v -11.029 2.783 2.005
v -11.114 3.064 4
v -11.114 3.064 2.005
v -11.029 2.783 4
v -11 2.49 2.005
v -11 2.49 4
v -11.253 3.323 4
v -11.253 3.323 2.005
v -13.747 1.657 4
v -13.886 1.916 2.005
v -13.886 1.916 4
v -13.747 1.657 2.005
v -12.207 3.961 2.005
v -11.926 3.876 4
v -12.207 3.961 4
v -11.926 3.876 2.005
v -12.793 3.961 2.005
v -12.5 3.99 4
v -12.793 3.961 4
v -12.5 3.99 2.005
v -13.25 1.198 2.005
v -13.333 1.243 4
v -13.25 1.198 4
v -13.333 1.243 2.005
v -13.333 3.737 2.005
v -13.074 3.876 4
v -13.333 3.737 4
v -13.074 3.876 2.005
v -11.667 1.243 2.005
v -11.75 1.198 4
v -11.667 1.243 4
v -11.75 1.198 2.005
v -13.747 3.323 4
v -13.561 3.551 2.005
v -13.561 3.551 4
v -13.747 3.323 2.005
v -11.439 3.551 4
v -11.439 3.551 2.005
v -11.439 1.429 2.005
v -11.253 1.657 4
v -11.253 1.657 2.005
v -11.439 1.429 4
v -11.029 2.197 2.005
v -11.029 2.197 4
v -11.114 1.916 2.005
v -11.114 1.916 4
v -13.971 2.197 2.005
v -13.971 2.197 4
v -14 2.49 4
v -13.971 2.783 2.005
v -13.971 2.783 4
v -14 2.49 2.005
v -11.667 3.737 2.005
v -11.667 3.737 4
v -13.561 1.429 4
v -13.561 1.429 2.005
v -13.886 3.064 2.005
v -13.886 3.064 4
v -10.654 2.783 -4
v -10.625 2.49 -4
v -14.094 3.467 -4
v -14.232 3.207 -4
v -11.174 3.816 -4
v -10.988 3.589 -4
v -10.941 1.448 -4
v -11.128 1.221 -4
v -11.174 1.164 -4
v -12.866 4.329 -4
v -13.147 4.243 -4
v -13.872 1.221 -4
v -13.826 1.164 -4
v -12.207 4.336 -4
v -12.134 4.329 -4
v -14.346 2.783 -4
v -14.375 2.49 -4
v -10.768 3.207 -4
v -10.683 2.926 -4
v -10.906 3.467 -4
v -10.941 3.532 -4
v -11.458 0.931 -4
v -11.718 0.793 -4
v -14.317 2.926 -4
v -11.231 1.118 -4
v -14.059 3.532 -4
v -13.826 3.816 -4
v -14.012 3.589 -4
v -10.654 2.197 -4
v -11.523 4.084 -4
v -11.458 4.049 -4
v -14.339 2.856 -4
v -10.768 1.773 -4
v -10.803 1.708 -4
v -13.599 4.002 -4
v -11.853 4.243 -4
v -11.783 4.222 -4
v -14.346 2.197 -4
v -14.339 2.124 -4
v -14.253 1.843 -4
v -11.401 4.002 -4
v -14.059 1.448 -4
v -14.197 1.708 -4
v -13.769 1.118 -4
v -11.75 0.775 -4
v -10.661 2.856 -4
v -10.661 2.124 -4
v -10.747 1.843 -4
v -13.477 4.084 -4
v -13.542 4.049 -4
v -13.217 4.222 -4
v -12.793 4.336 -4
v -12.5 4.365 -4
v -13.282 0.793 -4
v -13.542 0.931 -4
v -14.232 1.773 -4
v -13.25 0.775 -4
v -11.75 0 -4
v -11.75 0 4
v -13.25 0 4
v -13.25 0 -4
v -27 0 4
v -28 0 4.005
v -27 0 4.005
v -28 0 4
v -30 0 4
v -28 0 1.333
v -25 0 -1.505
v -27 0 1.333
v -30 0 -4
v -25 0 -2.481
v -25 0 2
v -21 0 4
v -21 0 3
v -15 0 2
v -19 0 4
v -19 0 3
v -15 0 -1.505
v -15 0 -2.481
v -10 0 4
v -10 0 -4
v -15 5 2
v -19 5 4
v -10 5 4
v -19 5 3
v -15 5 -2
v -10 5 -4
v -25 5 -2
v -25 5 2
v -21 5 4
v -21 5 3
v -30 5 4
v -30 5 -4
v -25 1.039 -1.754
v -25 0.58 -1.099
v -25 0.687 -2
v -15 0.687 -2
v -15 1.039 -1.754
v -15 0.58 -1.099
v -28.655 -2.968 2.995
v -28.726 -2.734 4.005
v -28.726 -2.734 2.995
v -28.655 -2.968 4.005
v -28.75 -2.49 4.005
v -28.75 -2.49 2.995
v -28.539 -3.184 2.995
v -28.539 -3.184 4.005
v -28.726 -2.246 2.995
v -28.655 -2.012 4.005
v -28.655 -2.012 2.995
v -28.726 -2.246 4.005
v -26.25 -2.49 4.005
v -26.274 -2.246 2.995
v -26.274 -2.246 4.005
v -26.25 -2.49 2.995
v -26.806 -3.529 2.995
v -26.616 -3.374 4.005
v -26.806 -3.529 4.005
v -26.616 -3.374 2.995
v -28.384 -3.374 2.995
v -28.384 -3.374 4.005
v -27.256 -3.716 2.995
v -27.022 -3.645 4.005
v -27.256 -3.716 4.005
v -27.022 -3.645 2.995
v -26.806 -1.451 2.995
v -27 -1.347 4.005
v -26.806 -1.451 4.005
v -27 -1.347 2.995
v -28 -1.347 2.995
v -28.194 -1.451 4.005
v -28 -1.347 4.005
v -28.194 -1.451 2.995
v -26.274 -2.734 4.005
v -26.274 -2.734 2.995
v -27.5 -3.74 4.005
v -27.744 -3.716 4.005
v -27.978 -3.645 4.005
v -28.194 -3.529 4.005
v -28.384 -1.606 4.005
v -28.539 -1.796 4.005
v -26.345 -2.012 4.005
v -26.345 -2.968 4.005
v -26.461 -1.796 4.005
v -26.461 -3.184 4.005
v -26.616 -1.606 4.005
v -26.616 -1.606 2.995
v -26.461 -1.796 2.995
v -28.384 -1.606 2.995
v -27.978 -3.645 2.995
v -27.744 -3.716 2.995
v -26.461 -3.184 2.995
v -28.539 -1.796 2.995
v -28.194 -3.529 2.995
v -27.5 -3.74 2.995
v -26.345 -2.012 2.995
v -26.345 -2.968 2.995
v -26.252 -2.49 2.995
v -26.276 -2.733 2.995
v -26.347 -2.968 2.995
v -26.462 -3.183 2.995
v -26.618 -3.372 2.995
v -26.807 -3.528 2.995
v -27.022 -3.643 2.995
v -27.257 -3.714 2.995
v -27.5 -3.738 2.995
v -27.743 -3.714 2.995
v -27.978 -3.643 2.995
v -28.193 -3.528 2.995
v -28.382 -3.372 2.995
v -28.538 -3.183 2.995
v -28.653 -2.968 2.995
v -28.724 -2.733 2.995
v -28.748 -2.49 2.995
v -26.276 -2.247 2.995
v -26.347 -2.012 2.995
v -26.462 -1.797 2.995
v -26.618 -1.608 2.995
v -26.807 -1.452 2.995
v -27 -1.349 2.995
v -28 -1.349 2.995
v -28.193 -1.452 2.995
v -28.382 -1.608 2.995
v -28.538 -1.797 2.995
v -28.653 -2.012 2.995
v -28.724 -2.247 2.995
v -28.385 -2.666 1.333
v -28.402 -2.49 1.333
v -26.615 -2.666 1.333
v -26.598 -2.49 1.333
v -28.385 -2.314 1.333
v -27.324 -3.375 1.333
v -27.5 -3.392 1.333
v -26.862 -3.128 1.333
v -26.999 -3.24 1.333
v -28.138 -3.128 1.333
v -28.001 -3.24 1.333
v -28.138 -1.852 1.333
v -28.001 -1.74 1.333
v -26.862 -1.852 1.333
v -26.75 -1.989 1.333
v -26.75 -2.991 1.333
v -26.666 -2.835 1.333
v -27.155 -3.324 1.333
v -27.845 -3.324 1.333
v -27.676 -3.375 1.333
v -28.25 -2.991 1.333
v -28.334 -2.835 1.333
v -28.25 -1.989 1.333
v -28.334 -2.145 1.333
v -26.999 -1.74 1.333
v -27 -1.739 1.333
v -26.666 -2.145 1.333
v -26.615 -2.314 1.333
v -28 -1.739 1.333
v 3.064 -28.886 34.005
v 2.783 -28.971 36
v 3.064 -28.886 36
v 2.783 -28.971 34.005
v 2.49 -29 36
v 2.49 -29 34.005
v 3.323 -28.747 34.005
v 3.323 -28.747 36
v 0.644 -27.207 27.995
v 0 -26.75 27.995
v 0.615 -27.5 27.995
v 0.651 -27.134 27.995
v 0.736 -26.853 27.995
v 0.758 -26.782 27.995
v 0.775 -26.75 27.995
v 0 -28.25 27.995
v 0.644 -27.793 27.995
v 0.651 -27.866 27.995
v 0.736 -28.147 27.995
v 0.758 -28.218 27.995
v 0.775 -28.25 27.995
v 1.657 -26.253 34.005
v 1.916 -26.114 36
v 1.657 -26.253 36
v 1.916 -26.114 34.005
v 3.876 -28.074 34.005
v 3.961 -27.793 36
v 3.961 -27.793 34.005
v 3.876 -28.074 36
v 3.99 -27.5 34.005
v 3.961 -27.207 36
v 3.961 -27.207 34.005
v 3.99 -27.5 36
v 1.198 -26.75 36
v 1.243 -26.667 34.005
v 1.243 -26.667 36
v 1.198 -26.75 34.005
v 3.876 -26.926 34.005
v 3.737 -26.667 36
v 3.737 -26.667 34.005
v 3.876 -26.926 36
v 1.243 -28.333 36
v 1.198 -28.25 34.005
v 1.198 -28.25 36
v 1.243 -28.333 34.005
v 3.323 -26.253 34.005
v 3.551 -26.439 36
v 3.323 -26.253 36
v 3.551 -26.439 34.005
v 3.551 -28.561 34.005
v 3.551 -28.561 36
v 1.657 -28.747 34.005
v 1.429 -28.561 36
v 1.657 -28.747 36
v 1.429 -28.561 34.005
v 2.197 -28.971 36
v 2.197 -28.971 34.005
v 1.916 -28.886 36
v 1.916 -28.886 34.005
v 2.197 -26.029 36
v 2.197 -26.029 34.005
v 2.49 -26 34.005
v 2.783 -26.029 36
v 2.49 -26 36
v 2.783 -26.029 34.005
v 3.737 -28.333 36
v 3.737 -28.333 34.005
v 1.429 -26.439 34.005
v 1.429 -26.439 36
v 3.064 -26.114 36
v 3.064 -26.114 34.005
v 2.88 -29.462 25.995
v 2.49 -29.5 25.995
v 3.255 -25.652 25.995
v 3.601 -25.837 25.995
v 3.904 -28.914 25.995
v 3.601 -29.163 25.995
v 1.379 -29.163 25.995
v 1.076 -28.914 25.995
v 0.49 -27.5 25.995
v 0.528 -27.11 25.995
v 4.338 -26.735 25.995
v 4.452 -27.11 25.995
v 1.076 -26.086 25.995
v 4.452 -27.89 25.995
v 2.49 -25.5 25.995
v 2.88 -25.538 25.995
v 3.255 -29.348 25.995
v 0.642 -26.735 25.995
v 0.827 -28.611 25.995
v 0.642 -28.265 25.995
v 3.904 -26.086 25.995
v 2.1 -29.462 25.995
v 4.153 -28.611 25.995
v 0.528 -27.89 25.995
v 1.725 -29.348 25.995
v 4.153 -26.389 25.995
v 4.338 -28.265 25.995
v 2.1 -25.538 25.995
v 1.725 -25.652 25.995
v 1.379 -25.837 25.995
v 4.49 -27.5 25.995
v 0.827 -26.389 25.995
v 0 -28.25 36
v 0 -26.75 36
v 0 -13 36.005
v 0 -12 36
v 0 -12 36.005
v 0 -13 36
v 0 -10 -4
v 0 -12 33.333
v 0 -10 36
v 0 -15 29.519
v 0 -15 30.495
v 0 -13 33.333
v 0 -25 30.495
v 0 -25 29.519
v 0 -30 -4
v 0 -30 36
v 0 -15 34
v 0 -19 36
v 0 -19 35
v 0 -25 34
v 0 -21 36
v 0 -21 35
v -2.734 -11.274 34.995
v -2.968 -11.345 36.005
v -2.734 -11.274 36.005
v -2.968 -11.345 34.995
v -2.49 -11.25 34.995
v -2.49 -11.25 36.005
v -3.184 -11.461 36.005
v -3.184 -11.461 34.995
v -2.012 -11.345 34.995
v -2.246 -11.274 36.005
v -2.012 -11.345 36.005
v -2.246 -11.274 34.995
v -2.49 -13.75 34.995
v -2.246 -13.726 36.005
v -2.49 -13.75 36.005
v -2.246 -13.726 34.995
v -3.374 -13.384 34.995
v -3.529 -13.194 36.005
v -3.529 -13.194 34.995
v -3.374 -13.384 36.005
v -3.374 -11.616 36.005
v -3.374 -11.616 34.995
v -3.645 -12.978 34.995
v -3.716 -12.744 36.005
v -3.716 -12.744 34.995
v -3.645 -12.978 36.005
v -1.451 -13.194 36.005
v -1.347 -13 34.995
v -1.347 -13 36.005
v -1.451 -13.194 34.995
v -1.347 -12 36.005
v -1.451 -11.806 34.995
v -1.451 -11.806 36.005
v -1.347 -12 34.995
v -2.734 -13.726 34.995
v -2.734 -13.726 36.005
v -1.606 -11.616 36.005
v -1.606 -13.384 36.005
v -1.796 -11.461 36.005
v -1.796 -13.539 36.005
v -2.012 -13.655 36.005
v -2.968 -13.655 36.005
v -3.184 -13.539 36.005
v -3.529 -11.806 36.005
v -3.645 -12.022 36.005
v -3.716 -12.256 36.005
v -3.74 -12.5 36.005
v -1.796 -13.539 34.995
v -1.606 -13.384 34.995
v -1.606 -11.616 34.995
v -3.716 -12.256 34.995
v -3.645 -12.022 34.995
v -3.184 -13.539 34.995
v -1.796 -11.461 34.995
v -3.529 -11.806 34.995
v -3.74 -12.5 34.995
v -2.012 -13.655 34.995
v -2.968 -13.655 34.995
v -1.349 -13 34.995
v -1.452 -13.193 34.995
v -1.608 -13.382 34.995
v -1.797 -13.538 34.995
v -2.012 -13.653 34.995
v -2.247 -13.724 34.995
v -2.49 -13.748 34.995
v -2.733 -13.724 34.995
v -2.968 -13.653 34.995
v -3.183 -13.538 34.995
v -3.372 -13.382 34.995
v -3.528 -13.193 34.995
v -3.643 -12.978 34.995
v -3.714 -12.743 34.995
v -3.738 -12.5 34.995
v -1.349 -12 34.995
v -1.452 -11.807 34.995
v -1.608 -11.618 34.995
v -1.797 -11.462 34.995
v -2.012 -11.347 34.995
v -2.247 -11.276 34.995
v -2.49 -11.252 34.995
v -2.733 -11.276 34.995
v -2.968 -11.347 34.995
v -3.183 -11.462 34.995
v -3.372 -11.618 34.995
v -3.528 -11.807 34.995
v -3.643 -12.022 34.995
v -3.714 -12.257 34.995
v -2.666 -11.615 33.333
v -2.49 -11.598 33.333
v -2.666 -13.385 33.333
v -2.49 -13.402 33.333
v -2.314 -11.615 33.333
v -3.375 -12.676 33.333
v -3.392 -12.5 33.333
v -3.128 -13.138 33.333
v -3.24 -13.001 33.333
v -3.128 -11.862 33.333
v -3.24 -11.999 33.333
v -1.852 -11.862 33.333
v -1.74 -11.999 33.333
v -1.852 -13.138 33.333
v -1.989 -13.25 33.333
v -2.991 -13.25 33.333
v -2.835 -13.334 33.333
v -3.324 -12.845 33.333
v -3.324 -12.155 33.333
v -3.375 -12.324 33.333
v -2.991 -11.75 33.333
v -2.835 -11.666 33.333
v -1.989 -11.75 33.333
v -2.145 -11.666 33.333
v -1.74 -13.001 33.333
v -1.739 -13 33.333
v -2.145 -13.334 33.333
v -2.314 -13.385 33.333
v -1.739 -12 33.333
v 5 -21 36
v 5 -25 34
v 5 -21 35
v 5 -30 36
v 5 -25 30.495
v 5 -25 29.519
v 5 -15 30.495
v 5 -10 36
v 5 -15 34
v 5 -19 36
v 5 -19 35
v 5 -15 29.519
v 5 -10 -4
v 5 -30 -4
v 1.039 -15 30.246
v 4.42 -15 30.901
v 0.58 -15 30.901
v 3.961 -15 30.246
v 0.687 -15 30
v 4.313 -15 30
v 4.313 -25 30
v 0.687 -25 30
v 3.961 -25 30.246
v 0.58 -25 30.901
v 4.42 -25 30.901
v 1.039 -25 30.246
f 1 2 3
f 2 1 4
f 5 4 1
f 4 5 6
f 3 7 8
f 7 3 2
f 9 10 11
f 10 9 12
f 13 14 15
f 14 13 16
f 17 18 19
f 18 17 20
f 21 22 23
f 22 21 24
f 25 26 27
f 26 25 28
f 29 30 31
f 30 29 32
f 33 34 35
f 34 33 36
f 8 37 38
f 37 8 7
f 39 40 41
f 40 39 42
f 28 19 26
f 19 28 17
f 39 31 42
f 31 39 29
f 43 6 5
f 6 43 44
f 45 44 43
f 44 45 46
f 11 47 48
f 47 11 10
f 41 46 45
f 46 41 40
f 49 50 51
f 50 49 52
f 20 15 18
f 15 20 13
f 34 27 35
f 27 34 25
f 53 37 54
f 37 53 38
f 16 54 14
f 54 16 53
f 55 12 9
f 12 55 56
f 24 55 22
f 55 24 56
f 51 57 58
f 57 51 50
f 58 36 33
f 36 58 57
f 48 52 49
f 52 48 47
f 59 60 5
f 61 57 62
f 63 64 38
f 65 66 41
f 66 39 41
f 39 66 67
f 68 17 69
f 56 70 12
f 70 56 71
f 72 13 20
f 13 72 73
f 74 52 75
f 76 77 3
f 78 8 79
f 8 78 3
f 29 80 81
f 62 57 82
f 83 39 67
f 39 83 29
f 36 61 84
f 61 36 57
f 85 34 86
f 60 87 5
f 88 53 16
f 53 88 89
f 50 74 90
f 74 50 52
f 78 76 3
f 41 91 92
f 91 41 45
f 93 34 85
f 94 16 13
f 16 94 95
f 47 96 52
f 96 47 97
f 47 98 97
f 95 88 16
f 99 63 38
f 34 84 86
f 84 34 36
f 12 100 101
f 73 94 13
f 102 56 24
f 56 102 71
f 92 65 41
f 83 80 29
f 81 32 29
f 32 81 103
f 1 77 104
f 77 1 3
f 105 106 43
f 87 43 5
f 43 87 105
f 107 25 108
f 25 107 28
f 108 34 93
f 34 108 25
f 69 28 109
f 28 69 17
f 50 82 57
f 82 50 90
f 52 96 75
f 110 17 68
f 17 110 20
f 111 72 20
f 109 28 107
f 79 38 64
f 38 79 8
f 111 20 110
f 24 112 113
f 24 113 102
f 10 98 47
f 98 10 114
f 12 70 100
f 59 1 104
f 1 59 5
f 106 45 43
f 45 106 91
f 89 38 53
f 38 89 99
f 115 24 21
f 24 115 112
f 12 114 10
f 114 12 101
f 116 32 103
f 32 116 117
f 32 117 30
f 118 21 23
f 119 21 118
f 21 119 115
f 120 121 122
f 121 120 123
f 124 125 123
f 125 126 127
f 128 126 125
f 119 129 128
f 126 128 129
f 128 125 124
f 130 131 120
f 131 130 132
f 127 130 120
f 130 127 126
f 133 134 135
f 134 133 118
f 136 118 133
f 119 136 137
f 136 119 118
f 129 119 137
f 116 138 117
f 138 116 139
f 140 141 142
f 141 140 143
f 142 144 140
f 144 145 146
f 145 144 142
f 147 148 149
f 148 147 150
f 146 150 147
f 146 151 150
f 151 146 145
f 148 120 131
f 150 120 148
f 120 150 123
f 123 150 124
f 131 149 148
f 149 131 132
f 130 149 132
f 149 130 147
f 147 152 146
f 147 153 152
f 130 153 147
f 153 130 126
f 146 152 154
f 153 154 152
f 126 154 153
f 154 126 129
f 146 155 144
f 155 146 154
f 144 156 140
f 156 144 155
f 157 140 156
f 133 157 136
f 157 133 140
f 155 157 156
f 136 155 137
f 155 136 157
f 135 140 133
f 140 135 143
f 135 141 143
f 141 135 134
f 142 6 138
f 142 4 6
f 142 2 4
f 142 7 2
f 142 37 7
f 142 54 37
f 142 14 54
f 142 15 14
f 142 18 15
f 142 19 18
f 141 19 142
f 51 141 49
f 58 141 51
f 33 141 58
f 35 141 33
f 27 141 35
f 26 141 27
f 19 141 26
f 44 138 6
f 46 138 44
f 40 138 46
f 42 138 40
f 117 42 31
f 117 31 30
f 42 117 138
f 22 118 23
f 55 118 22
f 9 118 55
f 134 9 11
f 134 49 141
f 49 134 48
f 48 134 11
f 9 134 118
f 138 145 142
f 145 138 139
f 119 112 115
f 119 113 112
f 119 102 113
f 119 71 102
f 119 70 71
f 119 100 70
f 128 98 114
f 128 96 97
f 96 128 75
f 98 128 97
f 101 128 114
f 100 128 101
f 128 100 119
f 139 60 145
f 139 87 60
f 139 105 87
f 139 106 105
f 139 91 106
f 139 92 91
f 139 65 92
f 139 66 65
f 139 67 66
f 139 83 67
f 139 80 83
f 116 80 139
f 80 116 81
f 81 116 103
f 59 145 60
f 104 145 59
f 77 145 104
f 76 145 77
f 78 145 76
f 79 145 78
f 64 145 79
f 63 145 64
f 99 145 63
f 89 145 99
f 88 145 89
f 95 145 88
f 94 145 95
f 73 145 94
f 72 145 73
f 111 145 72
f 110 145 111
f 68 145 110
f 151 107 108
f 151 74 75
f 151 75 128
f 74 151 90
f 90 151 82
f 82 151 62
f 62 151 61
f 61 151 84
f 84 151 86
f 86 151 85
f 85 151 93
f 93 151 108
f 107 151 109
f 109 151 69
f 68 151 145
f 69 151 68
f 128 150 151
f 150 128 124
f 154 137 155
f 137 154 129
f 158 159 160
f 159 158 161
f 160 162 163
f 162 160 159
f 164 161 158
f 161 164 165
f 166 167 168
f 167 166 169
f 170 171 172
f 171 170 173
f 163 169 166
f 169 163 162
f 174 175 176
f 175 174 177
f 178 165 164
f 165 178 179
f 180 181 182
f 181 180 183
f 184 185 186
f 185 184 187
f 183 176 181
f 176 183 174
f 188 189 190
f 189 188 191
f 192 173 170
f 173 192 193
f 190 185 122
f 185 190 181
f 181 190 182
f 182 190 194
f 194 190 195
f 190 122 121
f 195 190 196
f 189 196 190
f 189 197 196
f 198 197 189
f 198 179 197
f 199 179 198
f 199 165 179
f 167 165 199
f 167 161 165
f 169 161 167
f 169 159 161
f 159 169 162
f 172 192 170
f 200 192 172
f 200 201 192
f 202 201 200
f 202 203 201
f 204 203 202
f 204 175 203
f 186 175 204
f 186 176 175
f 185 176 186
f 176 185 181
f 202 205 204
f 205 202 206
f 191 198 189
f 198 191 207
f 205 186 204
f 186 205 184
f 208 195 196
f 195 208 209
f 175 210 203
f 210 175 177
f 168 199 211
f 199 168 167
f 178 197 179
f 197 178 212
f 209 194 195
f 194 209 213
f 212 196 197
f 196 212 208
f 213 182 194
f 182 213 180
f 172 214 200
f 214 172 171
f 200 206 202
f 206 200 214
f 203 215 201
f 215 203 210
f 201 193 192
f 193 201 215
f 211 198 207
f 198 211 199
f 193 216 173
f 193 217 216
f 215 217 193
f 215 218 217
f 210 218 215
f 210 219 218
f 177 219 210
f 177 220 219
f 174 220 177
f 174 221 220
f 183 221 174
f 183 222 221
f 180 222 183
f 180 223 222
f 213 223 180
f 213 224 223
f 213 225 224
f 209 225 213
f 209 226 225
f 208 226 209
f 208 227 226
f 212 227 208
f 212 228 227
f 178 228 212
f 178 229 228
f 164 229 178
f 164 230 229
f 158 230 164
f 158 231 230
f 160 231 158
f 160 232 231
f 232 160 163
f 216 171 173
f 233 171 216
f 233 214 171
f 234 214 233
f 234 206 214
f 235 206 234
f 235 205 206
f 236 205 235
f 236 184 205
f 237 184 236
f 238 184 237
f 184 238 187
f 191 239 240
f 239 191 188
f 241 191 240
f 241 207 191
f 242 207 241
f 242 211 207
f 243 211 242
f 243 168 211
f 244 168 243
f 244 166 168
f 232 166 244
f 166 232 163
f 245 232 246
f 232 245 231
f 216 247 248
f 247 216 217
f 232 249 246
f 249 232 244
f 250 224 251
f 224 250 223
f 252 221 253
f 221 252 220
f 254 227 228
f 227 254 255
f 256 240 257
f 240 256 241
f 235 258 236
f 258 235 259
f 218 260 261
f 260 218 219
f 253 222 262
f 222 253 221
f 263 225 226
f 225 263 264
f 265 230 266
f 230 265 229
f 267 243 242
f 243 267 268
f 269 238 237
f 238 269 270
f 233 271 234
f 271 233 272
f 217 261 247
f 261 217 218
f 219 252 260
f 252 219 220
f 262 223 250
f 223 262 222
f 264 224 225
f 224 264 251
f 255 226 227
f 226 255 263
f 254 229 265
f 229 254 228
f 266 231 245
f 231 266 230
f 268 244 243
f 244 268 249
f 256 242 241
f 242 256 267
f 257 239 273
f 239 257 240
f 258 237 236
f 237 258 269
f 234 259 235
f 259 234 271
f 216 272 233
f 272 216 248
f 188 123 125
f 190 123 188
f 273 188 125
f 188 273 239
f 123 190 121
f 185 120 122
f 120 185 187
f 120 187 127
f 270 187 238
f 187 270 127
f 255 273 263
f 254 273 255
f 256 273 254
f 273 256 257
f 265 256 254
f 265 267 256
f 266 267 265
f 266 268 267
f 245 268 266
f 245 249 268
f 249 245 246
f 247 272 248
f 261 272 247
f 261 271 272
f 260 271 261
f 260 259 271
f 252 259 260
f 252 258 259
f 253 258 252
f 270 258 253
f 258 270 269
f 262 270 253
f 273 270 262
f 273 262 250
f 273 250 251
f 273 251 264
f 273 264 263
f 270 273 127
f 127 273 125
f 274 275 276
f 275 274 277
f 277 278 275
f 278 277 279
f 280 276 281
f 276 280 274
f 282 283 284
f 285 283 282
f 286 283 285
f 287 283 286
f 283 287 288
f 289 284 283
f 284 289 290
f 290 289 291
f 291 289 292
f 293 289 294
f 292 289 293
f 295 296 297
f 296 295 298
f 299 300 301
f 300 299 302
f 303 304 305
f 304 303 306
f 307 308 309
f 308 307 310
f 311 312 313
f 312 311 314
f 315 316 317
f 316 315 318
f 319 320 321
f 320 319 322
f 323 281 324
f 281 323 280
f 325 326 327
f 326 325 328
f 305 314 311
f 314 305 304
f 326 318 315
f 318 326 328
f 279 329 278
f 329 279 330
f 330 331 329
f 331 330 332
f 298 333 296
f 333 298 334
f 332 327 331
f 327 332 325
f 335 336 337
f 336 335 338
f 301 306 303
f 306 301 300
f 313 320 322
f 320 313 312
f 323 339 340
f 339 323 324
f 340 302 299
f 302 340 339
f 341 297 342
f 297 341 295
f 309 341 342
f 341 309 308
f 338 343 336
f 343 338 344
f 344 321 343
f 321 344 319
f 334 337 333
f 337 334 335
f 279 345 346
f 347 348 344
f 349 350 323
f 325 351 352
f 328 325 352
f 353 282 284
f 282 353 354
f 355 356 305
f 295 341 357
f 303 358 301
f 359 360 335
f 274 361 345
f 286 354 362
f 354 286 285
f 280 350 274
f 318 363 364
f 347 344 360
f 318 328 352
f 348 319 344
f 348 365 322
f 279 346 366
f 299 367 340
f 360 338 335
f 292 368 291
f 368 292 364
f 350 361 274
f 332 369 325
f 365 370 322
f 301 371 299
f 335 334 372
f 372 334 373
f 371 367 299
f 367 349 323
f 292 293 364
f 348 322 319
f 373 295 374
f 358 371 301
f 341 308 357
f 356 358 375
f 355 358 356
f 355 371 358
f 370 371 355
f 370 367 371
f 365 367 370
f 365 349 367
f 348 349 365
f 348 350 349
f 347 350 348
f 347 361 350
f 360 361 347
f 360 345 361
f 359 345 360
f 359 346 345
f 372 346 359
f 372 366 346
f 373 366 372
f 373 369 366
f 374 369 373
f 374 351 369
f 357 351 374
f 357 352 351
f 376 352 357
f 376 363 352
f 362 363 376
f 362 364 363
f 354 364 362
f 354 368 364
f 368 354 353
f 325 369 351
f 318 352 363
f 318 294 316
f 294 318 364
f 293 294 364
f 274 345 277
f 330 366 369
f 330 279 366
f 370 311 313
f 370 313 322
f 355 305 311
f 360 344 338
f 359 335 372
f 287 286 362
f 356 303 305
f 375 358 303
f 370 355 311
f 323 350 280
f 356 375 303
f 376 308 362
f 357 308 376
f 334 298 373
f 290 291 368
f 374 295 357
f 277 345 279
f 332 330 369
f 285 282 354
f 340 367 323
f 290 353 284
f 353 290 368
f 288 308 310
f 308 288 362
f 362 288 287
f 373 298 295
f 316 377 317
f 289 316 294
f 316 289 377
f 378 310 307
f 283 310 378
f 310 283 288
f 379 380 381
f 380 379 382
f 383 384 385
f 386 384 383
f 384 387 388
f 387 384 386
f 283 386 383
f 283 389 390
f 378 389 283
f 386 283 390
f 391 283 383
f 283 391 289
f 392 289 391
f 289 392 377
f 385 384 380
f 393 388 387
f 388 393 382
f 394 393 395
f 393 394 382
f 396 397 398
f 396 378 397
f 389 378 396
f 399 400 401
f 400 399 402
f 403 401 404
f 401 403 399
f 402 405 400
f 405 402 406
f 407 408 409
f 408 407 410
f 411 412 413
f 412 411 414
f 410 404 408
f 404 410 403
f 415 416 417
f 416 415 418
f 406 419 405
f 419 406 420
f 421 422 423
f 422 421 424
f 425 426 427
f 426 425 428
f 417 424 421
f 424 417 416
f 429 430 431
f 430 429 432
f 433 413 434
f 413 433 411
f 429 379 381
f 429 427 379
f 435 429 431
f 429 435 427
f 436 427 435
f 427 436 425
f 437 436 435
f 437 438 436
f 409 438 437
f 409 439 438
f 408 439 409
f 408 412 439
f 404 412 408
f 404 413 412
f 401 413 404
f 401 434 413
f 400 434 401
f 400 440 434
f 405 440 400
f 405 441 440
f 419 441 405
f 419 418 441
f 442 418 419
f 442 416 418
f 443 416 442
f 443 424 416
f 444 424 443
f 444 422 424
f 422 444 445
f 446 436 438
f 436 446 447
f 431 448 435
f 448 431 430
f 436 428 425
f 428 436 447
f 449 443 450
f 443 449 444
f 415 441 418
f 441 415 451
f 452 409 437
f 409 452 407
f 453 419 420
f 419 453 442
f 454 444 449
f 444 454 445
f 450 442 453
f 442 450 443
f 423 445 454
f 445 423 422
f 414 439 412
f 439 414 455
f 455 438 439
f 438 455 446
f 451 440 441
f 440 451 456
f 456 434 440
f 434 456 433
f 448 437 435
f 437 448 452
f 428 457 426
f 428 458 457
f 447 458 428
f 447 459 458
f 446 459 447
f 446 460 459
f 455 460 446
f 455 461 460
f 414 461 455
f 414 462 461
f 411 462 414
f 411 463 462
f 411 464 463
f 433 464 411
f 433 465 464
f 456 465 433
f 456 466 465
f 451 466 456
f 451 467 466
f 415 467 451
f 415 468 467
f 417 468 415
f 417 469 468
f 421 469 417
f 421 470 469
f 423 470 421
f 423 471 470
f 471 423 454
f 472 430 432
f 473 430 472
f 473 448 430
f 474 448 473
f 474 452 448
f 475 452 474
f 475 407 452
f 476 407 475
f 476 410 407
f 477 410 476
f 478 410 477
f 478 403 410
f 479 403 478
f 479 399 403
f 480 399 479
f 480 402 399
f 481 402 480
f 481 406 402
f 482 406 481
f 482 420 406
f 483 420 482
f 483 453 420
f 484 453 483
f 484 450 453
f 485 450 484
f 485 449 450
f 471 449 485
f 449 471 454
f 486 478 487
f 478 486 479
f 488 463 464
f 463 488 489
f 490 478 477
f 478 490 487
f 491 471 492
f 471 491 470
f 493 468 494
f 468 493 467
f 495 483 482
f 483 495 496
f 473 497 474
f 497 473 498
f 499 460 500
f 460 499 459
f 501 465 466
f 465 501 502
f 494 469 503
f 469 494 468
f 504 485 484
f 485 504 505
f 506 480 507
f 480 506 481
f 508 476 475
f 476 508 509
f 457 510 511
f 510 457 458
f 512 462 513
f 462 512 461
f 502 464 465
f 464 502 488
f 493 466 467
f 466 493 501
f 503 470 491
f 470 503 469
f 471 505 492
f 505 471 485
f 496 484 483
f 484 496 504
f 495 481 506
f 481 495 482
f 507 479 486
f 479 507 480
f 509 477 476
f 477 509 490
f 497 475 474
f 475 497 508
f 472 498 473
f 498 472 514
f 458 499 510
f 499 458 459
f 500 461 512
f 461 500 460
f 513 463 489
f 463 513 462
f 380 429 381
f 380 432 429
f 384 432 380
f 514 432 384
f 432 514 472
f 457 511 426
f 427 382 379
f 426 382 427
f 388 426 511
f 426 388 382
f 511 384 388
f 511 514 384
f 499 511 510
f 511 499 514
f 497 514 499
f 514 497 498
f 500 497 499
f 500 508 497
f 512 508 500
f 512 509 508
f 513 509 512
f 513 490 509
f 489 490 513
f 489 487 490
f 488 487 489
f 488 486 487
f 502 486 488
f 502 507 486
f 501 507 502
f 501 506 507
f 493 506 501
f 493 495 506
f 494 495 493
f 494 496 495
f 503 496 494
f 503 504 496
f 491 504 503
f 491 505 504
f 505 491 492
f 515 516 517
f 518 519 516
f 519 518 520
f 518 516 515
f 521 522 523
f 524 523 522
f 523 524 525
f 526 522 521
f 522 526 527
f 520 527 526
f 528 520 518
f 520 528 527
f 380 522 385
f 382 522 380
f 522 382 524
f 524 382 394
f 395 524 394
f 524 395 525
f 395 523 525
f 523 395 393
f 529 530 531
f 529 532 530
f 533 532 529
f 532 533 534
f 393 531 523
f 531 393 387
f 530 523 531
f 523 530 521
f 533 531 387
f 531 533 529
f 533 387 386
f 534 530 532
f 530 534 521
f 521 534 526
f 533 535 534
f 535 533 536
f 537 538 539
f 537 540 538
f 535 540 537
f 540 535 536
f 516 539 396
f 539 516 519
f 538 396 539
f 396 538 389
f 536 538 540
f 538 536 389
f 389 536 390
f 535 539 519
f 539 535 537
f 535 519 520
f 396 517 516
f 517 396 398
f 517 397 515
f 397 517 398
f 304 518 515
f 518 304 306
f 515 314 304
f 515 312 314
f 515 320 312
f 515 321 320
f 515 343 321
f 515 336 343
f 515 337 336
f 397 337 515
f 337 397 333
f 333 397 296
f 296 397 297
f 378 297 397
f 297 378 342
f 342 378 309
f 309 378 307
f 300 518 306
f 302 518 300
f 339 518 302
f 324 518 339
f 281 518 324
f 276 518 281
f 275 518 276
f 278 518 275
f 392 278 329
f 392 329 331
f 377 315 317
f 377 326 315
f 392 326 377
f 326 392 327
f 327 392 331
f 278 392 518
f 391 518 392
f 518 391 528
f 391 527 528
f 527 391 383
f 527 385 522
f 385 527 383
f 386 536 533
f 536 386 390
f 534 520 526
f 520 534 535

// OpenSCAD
include <train_tube_track.scad>;



ttt_curved270m_ramp_3();
